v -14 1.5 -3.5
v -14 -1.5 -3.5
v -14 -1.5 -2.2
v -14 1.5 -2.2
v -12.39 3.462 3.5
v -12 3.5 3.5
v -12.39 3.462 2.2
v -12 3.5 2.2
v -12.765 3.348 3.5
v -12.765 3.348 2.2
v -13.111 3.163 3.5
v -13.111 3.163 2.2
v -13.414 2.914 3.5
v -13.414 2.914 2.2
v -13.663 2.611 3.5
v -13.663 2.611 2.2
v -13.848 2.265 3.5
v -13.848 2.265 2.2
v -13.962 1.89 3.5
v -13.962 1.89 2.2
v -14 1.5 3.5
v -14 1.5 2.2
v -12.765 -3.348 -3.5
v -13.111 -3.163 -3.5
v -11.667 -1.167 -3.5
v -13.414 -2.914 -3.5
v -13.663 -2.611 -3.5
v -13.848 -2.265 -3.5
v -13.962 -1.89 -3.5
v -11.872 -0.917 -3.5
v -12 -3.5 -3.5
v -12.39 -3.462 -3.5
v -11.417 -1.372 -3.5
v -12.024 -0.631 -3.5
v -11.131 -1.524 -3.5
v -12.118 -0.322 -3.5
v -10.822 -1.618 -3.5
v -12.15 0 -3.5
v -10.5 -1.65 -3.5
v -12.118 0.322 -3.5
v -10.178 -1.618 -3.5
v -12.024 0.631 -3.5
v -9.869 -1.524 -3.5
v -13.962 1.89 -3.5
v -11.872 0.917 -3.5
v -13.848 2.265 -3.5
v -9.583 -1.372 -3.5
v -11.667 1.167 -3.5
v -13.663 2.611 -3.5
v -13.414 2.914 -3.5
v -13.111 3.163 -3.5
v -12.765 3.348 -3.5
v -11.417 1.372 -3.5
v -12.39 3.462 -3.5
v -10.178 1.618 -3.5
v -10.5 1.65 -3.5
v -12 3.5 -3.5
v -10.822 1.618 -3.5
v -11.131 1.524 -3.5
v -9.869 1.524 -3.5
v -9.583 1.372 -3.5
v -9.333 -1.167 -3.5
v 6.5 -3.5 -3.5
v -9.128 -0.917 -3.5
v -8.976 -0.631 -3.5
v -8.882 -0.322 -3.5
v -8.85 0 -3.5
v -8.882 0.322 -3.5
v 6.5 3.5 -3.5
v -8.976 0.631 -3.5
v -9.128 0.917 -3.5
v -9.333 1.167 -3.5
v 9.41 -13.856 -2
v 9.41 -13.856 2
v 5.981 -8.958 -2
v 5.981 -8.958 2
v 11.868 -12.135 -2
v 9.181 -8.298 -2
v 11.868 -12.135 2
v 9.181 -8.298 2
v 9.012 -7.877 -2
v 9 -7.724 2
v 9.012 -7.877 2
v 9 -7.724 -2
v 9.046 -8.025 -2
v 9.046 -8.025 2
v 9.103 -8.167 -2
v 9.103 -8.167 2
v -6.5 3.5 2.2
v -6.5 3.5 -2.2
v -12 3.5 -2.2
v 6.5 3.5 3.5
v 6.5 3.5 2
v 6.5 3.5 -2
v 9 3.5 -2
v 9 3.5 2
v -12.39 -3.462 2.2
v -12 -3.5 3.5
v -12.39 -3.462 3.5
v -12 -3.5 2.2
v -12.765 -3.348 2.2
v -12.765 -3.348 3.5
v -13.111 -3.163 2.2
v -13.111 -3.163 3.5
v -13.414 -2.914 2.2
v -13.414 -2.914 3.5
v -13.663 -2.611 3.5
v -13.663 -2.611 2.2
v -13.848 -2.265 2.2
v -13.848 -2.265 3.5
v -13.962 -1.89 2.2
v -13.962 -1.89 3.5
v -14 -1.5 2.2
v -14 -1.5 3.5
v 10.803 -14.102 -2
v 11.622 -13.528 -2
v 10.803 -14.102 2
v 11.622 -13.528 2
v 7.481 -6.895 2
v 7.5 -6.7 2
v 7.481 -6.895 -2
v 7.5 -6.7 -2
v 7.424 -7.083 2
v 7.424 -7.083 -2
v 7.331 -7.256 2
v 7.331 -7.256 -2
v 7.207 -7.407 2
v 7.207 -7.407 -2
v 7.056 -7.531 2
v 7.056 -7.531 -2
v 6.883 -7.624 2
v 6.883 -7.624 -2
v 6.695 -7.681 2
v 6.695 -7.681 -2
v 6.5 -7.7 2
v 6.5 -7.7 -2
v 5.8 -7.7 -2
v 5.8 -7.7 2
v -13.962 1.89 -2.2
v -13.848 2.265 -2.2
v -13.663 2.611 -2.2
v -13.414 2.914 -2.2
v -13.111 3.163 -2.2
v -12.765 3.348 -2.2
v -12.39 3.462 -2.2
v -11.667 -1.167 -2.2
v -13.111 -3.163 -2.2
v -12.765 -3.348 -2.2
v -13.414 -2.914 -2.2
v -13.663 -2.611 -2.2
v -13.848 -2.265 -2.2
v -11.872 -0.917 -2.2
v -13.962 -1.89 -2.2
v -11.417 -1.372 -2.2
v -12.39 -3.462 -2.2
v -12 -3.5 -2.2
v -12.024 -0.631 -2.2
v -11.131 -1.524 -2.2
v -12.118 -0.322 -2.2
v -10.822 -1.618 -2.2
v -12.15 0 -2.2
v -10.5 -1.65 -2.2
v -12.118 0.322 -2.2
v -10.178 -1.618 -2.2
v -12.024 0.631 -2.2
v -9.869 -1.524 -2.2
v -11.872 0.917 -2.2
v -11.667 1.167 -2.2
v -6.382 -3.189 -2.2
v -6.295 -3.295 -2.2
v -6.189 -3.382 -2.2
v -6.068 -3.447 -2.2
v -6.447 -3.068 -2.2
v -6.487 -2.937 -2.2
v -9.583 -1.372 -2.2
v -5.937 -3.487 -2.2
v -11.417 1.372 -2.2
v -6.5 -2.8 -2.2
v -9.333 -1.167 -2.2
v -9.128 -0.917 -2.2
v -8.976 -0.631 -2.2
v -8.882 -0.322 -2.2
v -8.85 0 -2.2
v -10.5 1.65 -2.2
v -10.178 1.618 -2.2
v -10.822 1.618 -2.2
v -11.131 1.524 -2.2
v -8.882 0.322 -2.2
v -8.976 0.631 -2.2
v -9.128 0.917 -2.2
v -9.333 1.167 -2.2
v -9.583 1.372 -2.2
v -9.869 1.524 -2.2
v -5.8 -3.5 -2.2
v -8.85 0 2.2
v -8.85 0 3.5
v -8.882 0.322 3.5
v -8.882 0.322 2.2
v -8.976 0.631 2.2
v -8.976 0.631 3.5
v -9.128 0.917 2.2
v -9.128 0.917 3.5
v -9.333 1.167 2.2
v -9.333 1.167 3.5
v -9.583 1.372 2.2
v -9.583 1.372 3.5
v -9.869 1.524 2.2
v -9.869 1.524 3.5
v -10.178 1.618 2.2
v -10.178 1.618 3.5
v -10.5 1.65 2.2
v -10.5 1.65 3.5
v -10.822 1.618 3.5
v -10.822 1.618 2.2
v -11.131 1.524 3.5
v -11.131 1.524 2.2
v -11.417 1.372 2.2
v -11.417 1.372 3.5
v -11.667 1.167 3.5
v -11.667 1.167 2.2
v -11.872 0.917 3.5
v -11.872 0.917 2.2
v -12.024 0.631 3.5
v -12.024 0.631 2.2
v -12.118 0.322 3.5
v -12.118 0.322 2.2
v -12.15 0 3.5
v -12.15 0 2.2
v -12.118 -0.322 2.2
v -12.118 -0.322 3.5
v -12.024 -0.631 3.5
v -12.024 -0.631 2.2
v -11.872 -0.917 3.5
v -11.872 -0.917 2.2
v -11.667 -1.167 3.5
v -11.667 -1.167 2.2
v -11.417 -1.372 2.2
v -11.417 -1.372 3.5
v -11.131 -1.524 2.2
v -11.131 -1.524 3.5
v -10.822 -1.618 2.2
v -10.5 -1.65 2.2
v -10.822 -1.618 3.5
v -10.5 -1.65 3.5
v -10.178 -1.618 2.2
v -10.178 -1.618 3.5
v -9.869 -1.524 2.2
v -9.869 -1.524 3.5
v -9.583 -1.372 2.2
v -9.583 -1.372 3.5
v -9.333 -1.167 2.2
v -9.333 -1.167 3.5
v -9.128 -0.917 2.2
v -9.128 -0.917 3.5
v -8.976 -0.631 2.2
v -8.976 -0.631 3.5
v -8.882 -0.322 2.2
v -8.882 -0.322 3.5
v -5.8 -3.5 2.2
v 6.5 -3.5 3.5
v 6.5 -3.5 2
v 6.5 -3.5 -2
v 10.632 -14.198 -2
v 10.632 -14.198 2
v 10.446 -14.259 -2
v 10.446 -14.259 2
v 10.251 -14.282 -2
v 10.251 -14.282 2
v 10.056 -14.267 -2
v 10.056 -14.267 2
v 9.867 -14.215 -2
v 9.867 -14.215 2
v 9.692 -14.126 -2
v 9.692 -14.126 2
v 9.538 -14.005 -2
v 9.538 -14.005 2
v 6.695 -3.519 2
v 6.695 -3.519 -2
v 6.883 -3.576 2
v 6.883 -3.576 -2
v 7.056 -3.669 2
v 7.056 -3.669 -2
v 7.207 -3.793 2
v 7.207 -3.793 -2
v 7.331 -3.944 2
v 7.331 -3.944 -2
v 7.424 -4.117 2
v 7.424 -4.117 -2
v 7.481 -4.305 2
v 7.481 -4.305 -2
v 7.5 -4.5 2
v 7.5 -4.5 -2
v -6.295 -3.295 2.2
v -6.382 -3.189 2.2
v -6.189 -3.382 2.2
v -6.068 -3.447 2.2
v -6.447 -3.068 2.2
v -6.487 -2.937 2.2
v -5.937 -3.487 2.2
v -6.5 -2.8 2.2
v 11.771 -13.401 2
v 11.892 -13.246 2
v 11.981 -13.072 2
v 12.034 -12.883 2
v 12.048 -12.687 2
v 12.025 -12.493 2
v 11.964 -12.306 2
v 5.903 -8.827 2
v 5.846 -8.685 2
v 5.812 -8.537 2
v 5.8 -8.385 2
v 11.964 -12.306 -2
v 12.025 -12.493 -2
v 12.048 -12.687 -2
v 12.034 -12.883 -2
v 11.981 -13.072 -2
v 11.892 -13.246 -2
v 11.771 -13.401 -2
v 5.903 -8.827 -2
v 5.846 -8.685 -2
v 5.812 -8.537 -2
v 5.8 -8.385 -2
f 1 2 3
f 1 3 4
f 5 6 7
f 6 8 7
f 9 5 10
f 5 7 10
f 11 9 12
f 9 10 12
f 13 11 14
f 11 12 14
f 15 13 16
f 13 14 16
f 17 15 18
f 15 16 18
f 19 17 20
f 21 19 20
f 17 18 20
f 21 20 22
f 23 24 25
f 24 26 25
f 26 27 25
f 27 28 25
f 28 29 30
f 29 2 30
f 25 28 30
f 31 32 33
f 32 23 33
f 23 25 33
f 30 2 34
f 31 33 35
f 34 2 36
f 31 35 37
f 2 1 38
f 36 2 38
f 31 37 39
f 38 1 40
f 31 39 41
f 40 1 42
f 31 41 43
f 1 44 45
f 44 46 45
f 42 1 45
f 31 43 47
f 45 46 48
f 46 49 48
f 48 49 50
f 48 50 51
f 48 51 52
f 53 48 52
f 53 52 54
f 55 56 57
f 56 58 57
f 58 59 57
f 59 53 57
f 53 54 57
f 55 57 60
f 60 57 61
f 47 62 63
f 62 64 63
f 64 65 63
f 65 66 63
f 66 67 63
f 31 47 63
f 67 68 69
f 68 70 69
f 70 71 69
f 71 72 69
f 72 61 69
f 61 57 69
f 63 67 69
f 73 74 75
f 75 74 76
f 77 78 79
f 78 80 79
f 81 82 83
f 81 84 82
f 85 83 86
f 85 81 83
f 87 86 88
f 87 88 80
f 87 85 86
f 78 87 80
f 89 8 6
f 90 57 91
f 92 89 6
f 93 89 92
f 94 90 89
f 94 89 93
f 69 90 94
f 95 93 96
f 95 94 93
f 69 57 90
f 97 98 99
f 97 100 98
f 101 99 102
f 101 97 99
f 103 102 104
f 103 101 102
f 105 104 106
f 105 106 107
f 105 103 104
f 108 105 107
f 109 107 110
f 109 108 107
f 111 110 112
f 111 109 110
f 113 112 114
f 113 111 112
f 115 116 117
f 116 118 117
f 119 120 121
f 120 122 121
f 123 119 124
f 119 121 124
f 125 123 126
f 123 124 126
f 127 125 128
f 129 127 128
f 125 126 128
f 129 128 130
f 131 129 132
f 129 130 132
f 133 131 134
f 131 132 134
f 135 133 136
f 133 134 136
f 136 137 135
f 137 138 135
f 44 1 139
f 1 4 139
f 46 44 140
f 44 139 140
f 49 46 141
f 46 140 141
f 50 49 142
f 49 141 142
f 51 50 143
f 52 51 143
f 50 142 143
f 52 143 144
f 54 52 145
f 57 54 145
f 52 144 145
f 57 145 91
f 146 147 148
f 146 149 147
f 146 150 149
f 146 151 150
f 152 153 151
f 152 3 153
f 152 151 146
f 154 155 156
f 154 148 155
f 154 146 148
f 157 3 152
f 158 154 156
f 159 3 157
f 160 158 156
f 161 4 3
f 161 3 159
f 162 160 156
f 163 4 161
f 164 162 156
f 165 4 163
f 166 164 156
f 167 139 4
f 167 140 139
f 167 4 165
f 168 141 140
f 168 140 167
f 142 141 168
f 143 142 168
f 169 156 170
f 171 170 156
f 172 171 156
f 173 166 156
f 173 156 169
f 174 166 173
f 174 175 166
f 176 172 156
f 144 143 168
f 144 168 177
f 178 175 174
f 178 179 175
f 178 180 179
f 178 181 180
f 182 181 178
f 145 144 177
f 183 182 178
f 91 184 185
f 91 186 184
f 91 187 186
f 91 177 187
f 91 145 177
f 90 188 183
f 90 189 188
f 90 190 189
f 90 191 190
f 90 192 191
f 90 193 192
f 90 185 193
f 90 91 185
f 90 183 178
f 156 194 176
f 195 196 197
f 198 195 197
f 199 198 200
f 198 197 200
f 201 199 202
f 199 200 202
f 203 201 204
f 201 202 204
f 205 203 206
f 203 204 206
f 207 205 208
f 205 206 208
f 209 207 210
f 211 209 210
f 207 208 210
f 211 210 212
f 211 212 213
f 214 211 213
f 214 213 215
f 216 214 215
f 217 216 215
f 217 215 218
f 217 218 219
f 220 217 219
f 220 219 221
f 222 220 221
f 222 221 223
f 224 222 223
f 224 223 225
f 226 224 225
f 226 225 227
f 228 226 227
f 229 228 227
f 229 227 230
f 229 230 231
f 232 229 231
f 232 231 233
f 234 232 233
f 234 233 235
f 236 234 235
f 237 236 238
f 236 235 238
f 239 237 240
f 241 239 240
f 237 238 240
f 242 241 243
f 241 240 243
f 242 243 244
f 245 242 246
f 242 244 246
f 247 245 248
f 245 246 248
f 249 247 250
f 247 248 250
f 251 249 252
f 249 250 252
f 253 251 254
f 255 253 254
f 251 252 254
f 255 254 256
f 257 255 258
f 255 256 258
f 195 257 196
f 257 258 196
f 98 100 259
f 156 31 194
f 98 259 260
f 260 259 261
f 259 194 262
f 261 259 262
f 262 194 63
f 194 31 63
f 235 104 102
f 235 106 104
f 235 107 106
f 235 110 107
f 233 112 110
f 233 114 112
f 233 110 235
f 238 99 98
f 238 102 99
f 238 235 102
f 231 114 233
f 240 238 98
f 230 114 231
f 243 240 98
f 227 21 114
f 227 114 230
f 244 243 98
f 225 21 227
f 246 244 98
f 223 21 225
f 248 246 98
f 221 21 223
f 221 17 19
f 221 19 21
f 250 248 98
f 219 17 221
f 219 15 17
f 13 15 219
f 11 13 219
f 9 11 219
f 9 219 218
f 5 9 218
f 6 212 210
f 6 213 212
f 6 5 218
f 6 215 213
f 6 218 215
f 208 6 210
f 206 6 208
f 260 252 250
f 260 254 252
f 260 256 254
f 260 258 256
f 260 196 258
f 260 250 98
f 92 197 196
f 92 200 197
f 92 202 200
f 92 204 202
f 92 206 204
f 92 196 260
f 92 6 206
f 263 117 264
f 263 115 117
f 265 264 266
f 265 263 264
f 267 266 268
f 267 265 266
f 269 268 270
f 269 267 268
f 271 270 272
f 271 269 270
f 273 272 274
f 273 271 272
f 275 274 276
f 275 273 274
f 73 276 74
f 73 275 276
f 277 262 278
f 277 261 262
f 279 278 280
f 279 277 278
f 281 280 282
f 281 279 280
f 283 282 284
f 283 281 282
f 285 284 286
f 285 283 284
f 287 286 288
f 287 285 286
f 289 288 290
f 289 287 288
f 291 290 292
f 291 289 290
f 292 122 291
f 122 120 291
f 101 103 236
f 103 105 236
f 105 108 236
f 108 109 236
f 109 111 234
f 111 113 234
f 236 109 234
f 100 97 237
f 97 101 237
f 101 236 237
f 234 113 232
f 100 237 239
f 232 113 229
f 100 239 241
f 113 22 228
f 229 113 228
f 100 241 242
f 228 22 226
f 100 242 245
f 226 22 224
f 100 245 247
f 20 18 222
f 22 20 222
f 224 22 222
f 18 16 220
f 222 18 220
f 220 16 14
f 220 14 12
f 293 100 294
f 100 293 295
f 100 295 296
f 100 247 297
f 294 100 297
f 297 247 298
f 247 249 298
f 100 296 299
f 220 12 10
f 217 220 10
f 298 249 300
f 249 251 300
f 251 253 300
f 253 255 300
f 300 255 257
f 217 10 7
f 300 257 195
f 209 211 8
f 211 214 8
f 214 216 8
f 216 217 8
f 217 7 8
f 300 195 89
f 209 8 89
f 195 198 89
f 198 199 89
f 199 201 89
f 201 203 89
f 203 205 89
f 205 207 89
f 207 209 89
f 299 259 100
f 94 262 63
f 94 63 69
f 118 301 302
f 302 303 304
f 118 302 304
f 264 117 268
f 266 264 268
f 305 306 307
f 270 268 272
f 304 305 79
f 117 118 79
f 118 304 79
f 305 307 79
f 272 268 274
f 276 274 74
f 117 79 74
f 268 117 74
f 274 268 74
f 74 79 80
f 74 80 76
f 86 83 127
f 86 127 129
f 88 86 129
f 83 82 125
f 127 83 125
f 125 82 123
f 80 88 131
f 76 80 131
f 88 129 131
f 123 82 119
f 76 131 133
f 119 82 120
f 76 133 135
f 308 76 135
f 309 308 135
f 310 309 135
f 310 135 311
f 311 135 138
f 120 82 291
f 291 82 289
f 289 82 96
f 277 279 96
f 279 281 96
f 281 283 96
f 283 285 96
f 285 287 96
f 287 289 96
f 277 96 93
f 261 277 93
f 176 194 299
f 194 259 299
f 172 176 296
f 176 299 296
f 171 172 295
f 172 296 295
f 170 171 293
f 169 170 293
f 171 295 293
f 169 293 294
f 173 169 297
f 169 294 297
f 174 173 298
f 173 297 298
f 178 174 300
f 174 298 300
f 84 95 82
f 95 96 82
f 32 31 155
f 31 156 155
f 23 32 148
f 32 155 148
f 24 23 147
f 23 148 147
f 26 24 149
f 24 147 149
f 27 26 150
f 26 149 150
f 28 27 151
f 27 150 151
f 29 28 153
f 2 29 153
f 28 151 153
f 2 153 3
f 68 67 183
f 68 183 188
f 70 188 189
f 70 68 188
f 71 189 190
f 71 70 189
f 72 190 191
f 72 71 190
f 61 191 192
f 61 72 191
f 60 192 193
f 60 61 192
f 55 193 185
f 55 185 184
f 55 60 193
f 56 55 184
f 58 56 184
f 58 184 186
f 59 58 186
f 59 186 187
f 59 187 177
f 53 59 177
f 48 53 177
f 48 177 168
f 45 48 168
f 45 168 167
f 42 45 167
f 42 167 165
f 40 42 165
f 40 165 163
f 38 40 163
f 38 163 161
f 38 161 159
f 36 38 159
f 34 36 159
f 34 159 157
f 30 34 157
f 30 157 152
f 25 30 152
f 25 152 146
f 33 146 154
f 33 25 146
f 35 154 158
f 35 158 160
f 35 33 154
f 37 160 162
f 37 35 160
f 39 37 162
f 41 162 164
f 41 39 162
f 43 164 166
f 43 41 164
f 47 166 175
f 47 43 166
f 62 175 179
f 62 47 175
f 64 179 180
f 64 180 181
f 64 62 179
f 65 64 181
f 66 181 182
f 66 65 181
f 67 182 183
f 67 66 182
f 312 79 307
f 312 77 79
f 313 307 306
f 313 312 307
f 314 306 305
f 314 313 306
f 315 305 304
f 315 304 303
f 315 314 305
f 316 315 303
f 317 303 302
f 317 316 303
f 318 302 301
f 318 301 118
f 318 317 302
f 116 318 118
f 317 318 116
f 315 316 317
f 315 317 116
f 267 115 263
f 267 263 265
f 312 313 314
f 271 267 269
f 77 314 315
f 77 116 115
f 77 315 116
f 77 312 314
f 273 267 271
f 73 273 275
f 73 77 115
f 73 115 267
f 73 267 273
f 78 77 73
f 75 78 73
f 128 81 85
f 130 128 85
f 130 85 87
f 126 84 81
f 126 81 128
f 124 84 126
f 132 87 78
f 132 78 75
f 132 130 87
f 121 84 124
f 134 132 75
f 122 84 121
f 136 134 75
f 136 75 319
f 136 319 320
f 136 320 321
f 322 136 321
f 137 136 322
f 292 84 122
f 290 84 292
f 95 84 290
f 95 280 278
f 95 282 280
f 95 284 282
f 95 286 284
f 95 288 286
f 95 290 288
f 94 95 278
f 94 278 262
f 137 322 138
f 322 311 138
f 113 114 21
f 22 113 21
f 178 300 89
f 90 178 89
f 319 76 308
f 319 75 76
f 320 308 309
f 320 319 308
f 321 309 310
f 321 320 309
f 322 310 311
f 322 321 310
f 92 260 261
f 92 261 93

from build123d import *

# Parameters (mm, degrees)
SKETCH1_W           = 13
SKETCH1_H           = 7
BOSS_EXTRUDE1_DEPTH = 3.5
SKETCH3_W           = 7.5
SKETCH3_H           = 7
BOSS_EXTRUDE2_DEPTH = 1.3
CUT_EXTRUDE2_REACH  = 18.039
SKETCH4_R           = 1.65
FILLET3_R           = 0.7
FILLET4_R           = 2
BOSS_EXTRUDE4_DEPTH = 2
FILLET5_R           = 1


with BuildPart() as part:
    # Sketch1 → Boss-Extrude1 (new, symmetric)
    with BuildSketch(Plane.XY):
        Rectangle(SKETCH1_W, SKETCH1_H)
    extrude(amount=BOSS_EXTRUDE1_DEPTH, both=True)

    # Sketch3 → Boss-Extrude2 (add)
    with BuildSketch(Plane.XY.offset(3.5)):
        with Locations((-10.25, 0)):
            Rectangle(SKETCH3_W, SKETCH3_H)
    boss_extrude2 = extrude(amount=-BOSS_EXTRUDE2_DEPTH)

    # Sketch4 → Cut-Extrude2 (cut, up to next)
    with BuildSketch(Plane.XY.offset(3.5), mode=Mode.PRIVATE) as cut_extrude2_sk1:
        with Locations((-10.5, 0)):
            Circle(SKETCH4_R)
    cut_extrude2_tool1 = extrude(cut_extrude2_sk1.sketch, amount=-CUT_EXTRUDE2_REACH, mode=Mode.PRIVATE) & part.part
    cut_extrude2 = cut_extrude2_tool1.solids().sort_by_distance((-10.5, 0, 3.5))[0]
    add(cut_extrude2, mode=Mode.SUBTRACT)

    # Mirror1: Boss-Extrude2, Cut-Extrude2 across plane
    add(boss_extrude2.mirror(Plane.XY))
    add(cut_extrude2.mirror(Plane.XY), mode=Mode.SUBTRACT)

    # Fillet3
    fillet3_edges = [part.edges().sort_by_distance(p)[0] for p in [
        (-6.5, -3.5, 0),
    ]]
    fillet(fillet3_edges, radius=FILLET3_R)

    # Fillet4
    fillet4_edges = [part.edges().sort_by_distance(p)[0] for p in [
        (-14, -3.5, 2.85),
        (-14, 3.5, 2.85),
        (-14, 3.5, -2.85),
        (-14, -3.5, -2.85),
    ]]
    fillet(fillet4_edges, radius=FILLET4_R)

    # Sketch6 → Boss-Extrude4 (add, symmetric)
    with BuildSketch(Plane.XY):
        Polygon((6.5, 3.5), (9, 3.5), (9, -8.039733235), (12.441458618, -12.9546455), (9.984002485, -14.675374809), (5.8, -8.7), (5.8, -7.7), (7.5, -7.7), (7.5, -3.5), (6.5, -3.5), align=None)
    extrude(amount=BOSS_EXTRUDE4_DEPTH, both=True)

    # Fillet5
    fillet5_edges = [part.edges().sort_by_distance(p)[0] for p in [
        (7.5, -3.5, 0),
        (7.5, -7.7, 0),
        (5.8, -8.7, 0),
        (9.984002485, -14.675374809, 0),
        (12.441458618, -12.9546455, 0),
        (9, -8.039733235, 0),
    ]]
    fillet(fillet5_edges, radius=FILLET5_R)


solid = part.part
